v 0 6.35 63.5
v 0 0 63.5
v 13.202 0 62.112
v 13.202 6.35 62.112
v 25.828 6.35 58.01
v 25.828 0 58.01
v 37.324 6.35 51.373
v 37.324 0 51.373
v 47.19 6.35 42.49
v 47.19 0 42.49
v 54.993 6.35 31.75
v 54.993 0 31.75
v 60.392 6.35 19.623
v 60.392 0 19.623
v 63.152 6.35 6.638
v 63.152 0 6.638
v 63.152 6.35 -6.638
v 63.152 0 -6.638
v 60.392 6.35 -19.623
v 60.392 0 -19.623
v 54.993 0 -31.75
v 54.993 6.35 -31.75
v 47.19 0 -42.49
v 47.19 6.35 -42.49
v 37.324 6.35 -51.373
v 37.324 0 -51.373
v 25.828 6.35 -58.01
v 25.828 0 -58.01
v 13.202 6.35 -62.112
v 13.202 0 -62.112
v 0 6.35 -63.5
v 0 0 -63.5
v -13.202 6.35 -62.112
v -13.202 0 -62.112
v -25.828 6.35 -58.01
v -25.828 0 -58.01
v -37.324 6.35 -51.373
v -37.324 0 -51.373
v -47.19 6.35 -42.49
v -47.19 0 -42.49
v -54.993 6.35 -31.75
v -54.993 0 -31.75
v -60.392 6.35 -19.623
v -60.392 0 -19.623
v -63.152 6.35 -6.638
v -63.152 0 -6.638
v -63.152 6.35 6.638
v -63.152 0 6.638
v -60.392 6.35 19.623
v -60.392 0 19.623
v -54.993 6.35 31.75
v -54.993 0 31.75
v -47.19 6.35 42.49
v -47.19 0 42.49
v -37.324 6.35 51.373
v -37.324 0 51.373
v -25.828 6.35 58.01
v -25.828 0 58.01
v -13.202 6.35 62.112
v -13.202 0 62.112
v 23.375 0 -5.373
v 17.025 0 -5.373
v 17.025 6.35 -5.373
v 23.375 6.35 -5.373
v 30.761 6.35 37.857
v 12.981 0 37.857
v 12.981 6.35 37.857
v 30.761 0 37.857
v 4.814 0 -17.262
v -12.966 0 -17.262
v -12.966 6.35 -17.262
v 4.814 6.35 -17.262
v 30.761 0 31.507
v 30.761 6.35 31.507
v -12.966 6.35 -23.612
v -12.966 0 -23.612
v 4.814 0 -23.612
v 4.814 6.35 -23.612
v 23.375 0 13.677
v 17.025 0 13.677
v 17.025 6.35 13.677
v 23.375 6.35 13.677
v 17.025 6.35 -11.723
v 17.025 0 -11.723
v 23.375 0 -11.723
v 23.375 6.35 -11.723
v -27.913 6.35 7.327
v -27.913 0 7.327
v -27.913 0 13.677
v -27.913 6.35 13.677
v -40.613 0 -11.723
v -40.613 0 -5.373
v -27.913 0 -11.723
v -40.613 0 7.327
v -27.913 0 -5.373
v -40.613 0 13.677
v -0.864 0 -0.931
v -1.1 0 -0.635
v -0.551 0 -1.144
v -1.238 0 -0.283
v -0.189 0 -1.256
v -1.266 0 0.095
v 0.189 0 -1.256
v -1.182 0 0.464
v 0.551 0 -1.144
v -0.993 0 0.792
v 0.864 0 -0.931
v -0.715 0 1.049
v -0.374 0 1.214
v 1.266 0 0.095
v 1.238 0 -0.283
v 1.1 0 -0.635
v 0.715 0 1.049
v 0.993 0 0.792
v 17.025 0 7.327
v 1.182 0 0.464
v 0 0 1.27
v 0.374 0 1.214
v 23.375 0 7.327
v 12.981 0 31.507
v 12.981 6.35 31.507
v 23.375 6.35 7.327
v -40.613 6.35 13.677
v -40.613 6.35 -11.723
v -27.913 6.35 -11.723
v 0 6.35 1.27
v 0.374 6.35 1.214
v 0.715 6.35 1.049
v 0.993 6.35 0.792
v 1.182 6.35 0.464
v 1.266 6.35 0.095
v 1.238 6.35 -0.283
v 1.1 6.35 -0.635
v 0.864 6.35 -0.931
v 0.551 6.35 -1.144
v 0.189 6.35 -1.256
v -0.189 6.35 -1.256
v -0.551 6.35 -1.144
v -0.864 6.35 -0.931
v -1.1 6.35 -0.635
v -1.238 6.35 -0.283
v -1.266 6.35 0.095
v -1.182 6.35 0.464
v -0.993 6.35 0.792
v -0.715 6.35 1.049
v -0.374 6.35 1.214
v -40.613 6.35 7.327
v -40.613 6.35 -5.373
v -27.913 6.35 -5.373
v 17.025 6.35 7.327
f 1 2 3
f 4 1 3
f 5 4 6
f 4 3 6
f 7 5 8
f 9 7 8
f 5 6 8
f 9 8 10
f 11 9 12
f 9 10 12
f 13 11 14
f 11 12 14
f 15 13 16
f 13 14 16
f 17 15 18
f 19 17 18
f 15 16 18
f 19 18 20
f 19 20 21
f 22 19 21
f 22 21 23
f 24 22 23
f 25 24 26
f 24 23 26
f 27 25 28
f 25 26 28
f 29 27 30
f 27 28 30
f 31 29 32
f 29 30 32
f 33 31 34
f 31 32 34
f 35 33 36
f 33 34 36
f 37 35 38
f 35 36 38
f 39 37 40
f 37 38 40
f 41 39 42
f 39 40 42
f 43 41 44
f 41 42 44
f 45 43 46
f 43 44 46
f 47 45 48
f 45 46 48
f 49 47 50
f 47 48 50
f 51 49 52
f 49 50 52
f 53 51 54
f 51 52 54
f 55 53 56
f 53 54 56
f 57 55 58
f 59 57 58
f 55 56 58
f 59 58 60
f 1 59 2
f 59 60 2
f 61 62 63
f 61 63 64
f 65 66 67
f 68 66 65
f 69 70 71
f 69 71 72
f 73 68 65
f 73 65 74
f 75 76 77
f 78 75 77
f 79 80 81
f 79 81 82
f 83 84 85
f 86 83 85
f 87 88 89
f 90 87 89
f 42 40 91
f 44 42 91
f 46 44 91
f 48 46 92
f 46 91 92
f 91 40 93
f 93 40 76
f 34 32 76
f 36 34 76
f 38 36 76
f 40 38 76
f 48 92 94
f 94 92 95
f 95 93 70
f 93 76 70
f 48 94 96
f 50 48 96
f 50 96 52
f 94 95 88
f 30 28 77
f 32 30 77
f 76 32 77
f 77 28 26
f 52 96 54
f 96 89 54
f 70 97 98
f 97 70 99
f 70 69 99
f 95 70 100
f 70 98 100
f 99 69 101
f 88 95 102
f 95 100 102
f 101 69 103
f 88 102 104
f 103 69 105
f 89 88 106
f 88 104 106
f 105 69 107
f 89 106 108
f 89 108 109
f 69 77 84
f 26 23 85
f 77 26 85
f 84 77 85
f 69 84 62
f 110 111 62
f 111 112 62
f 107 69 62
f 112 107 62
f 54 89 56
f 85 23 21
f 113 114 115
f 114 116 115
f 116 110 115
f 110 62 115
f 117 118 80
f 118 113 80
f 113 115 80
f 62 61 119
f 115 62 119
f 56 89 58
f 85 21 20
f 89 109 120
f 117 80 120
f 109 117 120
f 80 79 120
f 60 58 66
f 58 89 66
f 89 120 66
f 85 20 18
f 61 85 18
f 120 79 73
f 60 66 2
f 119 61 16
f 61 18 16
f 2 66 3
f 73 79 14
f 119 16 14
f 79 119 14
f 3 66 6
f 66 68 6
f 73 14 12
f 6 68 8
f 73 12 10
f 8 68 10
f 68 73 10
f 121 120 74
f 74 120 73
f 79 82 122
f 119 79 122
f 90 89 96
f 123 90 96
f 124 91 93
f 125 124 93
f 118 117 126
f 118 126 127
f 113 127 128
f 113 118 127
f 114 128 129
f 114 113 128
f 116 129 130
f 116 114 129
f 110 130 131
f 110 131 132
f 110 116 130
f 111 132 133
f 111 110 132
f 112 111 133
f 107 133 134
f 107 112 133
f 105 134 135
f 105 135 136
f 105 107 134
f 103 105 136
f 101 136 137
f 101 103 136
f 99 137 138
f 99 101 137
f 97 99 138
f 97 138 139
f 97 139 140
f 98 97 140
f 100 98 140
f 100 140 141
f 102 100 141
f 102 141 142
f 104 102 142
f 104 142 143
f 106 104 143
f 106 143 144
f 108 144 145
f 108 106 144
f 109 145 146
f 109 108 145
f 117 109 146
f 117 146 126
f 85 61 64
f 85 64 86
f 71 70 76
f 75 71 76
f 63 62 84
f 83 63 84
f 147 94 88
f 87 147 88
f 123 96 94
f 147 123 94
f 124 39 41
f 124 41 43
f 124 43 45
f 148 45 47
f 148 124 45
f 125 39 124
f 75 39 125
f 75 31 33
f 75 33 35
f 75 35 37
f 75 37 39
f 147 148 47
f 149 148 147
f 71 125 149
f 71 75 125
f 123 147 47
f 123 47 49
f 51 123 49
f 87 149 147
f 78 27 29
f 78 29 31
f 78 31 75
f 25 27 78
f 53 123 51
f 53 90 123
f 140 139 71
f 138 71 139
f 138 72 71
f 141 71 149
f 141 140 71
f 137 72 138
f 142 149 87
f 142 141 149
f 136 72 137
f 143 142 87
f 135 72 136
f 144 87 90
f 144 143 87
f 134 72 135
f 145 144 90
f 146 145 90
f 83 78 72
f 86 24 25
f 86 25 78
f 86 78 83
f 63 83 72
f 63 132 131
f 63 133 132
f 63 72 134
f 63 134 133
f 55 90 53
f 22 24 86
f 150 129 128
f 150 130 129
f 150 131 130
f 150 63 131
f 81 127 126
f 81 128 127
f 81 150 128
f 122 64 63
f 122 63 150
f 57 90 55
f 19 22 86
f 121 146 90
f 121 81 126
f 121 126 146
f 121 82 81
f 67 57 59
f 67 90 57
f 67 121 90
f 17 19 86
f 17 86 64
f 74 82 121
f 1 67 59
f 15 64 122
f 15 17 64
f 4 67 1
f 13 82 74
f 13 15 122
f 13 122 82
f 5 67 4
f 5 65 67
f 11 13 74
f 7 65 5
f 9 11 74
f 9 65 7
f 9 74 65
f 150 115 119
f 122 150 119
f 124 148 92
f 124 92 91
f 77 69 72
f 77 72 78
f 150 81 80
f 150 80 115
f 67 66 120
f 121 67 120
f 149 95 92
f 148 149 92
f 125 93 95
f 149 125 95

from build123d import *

# Parameters (mm, degrees)
SKETCH1_R           = 63.5
SKETCH1_W           = 17.78
SKETCH1_H           = 6.35
SKETCH1_W_2         = 6.35
SKETCH1_R_2         = 1.27
BOSS_EXTRUDE3_DEPTH = 6.35


with BuildPart() as part:
    # Sketch1 → Boss-Extrude3 (new body)
    with BuildSketch(Plane(origin=(0, 0, 0), x_dir=(1, 0, 0), z_dir=(0, 1, 0))):
        with Locations(Location((0, 0, 0), (0, 0, 270))):
            Circle(SKETCH1_R)
        Polygon((-34.262799333, -7.326577006), (-27.912799333, -7.326577006), (-27.912799333, -13.676577006), (-34.262799333, -13.676577006), (-40.612799333, -13.676577006), (-40.612799333, -7.326577006), align=None, mode=Mode.SUBTRACT)
        with Locations((21.870627403, -34.682199949)):
            Rectangle(SKETCH1_W, SKETCH1_H, mode=Mode.SUBTRACT)
        with Locations((20.20048917, -10.501577006)):
            Rectangle(SKETCH1_W_2, SKETCH1_H, mode=Mode.SUBTRACT)
        Polygon((-27.912799333, 5.373422994), (-34.262799333, 5.373422994), (-40.612799333, 5.373422994), (-40.612799333, 11.723422994), (-34.262799333, 11.723422994), (-27.912799333, 11.723422994), align=None, mode=Mode.SUBTRACT)
        with Locations((-4.076334422, 20.437374514)):
            Rectangle(SKETCH1_W, SKETCH1_H, mode=Mode.SUBTRACT)
        with Locations(Location((0, 0, 0), (0, 0, 270))):
            Circle(SKETCH1_R_2, mode=Mode.SUBTRACT)
        with Locations((20.20048917, 8.548422994)):
            Rectangle(SKETCH1_W_2, SKETCH1_H, mode=Mode.SUBTRACT)
    extrude(amount=BOSS_EXTRUDE3_DEPTH)


solid = part.part
